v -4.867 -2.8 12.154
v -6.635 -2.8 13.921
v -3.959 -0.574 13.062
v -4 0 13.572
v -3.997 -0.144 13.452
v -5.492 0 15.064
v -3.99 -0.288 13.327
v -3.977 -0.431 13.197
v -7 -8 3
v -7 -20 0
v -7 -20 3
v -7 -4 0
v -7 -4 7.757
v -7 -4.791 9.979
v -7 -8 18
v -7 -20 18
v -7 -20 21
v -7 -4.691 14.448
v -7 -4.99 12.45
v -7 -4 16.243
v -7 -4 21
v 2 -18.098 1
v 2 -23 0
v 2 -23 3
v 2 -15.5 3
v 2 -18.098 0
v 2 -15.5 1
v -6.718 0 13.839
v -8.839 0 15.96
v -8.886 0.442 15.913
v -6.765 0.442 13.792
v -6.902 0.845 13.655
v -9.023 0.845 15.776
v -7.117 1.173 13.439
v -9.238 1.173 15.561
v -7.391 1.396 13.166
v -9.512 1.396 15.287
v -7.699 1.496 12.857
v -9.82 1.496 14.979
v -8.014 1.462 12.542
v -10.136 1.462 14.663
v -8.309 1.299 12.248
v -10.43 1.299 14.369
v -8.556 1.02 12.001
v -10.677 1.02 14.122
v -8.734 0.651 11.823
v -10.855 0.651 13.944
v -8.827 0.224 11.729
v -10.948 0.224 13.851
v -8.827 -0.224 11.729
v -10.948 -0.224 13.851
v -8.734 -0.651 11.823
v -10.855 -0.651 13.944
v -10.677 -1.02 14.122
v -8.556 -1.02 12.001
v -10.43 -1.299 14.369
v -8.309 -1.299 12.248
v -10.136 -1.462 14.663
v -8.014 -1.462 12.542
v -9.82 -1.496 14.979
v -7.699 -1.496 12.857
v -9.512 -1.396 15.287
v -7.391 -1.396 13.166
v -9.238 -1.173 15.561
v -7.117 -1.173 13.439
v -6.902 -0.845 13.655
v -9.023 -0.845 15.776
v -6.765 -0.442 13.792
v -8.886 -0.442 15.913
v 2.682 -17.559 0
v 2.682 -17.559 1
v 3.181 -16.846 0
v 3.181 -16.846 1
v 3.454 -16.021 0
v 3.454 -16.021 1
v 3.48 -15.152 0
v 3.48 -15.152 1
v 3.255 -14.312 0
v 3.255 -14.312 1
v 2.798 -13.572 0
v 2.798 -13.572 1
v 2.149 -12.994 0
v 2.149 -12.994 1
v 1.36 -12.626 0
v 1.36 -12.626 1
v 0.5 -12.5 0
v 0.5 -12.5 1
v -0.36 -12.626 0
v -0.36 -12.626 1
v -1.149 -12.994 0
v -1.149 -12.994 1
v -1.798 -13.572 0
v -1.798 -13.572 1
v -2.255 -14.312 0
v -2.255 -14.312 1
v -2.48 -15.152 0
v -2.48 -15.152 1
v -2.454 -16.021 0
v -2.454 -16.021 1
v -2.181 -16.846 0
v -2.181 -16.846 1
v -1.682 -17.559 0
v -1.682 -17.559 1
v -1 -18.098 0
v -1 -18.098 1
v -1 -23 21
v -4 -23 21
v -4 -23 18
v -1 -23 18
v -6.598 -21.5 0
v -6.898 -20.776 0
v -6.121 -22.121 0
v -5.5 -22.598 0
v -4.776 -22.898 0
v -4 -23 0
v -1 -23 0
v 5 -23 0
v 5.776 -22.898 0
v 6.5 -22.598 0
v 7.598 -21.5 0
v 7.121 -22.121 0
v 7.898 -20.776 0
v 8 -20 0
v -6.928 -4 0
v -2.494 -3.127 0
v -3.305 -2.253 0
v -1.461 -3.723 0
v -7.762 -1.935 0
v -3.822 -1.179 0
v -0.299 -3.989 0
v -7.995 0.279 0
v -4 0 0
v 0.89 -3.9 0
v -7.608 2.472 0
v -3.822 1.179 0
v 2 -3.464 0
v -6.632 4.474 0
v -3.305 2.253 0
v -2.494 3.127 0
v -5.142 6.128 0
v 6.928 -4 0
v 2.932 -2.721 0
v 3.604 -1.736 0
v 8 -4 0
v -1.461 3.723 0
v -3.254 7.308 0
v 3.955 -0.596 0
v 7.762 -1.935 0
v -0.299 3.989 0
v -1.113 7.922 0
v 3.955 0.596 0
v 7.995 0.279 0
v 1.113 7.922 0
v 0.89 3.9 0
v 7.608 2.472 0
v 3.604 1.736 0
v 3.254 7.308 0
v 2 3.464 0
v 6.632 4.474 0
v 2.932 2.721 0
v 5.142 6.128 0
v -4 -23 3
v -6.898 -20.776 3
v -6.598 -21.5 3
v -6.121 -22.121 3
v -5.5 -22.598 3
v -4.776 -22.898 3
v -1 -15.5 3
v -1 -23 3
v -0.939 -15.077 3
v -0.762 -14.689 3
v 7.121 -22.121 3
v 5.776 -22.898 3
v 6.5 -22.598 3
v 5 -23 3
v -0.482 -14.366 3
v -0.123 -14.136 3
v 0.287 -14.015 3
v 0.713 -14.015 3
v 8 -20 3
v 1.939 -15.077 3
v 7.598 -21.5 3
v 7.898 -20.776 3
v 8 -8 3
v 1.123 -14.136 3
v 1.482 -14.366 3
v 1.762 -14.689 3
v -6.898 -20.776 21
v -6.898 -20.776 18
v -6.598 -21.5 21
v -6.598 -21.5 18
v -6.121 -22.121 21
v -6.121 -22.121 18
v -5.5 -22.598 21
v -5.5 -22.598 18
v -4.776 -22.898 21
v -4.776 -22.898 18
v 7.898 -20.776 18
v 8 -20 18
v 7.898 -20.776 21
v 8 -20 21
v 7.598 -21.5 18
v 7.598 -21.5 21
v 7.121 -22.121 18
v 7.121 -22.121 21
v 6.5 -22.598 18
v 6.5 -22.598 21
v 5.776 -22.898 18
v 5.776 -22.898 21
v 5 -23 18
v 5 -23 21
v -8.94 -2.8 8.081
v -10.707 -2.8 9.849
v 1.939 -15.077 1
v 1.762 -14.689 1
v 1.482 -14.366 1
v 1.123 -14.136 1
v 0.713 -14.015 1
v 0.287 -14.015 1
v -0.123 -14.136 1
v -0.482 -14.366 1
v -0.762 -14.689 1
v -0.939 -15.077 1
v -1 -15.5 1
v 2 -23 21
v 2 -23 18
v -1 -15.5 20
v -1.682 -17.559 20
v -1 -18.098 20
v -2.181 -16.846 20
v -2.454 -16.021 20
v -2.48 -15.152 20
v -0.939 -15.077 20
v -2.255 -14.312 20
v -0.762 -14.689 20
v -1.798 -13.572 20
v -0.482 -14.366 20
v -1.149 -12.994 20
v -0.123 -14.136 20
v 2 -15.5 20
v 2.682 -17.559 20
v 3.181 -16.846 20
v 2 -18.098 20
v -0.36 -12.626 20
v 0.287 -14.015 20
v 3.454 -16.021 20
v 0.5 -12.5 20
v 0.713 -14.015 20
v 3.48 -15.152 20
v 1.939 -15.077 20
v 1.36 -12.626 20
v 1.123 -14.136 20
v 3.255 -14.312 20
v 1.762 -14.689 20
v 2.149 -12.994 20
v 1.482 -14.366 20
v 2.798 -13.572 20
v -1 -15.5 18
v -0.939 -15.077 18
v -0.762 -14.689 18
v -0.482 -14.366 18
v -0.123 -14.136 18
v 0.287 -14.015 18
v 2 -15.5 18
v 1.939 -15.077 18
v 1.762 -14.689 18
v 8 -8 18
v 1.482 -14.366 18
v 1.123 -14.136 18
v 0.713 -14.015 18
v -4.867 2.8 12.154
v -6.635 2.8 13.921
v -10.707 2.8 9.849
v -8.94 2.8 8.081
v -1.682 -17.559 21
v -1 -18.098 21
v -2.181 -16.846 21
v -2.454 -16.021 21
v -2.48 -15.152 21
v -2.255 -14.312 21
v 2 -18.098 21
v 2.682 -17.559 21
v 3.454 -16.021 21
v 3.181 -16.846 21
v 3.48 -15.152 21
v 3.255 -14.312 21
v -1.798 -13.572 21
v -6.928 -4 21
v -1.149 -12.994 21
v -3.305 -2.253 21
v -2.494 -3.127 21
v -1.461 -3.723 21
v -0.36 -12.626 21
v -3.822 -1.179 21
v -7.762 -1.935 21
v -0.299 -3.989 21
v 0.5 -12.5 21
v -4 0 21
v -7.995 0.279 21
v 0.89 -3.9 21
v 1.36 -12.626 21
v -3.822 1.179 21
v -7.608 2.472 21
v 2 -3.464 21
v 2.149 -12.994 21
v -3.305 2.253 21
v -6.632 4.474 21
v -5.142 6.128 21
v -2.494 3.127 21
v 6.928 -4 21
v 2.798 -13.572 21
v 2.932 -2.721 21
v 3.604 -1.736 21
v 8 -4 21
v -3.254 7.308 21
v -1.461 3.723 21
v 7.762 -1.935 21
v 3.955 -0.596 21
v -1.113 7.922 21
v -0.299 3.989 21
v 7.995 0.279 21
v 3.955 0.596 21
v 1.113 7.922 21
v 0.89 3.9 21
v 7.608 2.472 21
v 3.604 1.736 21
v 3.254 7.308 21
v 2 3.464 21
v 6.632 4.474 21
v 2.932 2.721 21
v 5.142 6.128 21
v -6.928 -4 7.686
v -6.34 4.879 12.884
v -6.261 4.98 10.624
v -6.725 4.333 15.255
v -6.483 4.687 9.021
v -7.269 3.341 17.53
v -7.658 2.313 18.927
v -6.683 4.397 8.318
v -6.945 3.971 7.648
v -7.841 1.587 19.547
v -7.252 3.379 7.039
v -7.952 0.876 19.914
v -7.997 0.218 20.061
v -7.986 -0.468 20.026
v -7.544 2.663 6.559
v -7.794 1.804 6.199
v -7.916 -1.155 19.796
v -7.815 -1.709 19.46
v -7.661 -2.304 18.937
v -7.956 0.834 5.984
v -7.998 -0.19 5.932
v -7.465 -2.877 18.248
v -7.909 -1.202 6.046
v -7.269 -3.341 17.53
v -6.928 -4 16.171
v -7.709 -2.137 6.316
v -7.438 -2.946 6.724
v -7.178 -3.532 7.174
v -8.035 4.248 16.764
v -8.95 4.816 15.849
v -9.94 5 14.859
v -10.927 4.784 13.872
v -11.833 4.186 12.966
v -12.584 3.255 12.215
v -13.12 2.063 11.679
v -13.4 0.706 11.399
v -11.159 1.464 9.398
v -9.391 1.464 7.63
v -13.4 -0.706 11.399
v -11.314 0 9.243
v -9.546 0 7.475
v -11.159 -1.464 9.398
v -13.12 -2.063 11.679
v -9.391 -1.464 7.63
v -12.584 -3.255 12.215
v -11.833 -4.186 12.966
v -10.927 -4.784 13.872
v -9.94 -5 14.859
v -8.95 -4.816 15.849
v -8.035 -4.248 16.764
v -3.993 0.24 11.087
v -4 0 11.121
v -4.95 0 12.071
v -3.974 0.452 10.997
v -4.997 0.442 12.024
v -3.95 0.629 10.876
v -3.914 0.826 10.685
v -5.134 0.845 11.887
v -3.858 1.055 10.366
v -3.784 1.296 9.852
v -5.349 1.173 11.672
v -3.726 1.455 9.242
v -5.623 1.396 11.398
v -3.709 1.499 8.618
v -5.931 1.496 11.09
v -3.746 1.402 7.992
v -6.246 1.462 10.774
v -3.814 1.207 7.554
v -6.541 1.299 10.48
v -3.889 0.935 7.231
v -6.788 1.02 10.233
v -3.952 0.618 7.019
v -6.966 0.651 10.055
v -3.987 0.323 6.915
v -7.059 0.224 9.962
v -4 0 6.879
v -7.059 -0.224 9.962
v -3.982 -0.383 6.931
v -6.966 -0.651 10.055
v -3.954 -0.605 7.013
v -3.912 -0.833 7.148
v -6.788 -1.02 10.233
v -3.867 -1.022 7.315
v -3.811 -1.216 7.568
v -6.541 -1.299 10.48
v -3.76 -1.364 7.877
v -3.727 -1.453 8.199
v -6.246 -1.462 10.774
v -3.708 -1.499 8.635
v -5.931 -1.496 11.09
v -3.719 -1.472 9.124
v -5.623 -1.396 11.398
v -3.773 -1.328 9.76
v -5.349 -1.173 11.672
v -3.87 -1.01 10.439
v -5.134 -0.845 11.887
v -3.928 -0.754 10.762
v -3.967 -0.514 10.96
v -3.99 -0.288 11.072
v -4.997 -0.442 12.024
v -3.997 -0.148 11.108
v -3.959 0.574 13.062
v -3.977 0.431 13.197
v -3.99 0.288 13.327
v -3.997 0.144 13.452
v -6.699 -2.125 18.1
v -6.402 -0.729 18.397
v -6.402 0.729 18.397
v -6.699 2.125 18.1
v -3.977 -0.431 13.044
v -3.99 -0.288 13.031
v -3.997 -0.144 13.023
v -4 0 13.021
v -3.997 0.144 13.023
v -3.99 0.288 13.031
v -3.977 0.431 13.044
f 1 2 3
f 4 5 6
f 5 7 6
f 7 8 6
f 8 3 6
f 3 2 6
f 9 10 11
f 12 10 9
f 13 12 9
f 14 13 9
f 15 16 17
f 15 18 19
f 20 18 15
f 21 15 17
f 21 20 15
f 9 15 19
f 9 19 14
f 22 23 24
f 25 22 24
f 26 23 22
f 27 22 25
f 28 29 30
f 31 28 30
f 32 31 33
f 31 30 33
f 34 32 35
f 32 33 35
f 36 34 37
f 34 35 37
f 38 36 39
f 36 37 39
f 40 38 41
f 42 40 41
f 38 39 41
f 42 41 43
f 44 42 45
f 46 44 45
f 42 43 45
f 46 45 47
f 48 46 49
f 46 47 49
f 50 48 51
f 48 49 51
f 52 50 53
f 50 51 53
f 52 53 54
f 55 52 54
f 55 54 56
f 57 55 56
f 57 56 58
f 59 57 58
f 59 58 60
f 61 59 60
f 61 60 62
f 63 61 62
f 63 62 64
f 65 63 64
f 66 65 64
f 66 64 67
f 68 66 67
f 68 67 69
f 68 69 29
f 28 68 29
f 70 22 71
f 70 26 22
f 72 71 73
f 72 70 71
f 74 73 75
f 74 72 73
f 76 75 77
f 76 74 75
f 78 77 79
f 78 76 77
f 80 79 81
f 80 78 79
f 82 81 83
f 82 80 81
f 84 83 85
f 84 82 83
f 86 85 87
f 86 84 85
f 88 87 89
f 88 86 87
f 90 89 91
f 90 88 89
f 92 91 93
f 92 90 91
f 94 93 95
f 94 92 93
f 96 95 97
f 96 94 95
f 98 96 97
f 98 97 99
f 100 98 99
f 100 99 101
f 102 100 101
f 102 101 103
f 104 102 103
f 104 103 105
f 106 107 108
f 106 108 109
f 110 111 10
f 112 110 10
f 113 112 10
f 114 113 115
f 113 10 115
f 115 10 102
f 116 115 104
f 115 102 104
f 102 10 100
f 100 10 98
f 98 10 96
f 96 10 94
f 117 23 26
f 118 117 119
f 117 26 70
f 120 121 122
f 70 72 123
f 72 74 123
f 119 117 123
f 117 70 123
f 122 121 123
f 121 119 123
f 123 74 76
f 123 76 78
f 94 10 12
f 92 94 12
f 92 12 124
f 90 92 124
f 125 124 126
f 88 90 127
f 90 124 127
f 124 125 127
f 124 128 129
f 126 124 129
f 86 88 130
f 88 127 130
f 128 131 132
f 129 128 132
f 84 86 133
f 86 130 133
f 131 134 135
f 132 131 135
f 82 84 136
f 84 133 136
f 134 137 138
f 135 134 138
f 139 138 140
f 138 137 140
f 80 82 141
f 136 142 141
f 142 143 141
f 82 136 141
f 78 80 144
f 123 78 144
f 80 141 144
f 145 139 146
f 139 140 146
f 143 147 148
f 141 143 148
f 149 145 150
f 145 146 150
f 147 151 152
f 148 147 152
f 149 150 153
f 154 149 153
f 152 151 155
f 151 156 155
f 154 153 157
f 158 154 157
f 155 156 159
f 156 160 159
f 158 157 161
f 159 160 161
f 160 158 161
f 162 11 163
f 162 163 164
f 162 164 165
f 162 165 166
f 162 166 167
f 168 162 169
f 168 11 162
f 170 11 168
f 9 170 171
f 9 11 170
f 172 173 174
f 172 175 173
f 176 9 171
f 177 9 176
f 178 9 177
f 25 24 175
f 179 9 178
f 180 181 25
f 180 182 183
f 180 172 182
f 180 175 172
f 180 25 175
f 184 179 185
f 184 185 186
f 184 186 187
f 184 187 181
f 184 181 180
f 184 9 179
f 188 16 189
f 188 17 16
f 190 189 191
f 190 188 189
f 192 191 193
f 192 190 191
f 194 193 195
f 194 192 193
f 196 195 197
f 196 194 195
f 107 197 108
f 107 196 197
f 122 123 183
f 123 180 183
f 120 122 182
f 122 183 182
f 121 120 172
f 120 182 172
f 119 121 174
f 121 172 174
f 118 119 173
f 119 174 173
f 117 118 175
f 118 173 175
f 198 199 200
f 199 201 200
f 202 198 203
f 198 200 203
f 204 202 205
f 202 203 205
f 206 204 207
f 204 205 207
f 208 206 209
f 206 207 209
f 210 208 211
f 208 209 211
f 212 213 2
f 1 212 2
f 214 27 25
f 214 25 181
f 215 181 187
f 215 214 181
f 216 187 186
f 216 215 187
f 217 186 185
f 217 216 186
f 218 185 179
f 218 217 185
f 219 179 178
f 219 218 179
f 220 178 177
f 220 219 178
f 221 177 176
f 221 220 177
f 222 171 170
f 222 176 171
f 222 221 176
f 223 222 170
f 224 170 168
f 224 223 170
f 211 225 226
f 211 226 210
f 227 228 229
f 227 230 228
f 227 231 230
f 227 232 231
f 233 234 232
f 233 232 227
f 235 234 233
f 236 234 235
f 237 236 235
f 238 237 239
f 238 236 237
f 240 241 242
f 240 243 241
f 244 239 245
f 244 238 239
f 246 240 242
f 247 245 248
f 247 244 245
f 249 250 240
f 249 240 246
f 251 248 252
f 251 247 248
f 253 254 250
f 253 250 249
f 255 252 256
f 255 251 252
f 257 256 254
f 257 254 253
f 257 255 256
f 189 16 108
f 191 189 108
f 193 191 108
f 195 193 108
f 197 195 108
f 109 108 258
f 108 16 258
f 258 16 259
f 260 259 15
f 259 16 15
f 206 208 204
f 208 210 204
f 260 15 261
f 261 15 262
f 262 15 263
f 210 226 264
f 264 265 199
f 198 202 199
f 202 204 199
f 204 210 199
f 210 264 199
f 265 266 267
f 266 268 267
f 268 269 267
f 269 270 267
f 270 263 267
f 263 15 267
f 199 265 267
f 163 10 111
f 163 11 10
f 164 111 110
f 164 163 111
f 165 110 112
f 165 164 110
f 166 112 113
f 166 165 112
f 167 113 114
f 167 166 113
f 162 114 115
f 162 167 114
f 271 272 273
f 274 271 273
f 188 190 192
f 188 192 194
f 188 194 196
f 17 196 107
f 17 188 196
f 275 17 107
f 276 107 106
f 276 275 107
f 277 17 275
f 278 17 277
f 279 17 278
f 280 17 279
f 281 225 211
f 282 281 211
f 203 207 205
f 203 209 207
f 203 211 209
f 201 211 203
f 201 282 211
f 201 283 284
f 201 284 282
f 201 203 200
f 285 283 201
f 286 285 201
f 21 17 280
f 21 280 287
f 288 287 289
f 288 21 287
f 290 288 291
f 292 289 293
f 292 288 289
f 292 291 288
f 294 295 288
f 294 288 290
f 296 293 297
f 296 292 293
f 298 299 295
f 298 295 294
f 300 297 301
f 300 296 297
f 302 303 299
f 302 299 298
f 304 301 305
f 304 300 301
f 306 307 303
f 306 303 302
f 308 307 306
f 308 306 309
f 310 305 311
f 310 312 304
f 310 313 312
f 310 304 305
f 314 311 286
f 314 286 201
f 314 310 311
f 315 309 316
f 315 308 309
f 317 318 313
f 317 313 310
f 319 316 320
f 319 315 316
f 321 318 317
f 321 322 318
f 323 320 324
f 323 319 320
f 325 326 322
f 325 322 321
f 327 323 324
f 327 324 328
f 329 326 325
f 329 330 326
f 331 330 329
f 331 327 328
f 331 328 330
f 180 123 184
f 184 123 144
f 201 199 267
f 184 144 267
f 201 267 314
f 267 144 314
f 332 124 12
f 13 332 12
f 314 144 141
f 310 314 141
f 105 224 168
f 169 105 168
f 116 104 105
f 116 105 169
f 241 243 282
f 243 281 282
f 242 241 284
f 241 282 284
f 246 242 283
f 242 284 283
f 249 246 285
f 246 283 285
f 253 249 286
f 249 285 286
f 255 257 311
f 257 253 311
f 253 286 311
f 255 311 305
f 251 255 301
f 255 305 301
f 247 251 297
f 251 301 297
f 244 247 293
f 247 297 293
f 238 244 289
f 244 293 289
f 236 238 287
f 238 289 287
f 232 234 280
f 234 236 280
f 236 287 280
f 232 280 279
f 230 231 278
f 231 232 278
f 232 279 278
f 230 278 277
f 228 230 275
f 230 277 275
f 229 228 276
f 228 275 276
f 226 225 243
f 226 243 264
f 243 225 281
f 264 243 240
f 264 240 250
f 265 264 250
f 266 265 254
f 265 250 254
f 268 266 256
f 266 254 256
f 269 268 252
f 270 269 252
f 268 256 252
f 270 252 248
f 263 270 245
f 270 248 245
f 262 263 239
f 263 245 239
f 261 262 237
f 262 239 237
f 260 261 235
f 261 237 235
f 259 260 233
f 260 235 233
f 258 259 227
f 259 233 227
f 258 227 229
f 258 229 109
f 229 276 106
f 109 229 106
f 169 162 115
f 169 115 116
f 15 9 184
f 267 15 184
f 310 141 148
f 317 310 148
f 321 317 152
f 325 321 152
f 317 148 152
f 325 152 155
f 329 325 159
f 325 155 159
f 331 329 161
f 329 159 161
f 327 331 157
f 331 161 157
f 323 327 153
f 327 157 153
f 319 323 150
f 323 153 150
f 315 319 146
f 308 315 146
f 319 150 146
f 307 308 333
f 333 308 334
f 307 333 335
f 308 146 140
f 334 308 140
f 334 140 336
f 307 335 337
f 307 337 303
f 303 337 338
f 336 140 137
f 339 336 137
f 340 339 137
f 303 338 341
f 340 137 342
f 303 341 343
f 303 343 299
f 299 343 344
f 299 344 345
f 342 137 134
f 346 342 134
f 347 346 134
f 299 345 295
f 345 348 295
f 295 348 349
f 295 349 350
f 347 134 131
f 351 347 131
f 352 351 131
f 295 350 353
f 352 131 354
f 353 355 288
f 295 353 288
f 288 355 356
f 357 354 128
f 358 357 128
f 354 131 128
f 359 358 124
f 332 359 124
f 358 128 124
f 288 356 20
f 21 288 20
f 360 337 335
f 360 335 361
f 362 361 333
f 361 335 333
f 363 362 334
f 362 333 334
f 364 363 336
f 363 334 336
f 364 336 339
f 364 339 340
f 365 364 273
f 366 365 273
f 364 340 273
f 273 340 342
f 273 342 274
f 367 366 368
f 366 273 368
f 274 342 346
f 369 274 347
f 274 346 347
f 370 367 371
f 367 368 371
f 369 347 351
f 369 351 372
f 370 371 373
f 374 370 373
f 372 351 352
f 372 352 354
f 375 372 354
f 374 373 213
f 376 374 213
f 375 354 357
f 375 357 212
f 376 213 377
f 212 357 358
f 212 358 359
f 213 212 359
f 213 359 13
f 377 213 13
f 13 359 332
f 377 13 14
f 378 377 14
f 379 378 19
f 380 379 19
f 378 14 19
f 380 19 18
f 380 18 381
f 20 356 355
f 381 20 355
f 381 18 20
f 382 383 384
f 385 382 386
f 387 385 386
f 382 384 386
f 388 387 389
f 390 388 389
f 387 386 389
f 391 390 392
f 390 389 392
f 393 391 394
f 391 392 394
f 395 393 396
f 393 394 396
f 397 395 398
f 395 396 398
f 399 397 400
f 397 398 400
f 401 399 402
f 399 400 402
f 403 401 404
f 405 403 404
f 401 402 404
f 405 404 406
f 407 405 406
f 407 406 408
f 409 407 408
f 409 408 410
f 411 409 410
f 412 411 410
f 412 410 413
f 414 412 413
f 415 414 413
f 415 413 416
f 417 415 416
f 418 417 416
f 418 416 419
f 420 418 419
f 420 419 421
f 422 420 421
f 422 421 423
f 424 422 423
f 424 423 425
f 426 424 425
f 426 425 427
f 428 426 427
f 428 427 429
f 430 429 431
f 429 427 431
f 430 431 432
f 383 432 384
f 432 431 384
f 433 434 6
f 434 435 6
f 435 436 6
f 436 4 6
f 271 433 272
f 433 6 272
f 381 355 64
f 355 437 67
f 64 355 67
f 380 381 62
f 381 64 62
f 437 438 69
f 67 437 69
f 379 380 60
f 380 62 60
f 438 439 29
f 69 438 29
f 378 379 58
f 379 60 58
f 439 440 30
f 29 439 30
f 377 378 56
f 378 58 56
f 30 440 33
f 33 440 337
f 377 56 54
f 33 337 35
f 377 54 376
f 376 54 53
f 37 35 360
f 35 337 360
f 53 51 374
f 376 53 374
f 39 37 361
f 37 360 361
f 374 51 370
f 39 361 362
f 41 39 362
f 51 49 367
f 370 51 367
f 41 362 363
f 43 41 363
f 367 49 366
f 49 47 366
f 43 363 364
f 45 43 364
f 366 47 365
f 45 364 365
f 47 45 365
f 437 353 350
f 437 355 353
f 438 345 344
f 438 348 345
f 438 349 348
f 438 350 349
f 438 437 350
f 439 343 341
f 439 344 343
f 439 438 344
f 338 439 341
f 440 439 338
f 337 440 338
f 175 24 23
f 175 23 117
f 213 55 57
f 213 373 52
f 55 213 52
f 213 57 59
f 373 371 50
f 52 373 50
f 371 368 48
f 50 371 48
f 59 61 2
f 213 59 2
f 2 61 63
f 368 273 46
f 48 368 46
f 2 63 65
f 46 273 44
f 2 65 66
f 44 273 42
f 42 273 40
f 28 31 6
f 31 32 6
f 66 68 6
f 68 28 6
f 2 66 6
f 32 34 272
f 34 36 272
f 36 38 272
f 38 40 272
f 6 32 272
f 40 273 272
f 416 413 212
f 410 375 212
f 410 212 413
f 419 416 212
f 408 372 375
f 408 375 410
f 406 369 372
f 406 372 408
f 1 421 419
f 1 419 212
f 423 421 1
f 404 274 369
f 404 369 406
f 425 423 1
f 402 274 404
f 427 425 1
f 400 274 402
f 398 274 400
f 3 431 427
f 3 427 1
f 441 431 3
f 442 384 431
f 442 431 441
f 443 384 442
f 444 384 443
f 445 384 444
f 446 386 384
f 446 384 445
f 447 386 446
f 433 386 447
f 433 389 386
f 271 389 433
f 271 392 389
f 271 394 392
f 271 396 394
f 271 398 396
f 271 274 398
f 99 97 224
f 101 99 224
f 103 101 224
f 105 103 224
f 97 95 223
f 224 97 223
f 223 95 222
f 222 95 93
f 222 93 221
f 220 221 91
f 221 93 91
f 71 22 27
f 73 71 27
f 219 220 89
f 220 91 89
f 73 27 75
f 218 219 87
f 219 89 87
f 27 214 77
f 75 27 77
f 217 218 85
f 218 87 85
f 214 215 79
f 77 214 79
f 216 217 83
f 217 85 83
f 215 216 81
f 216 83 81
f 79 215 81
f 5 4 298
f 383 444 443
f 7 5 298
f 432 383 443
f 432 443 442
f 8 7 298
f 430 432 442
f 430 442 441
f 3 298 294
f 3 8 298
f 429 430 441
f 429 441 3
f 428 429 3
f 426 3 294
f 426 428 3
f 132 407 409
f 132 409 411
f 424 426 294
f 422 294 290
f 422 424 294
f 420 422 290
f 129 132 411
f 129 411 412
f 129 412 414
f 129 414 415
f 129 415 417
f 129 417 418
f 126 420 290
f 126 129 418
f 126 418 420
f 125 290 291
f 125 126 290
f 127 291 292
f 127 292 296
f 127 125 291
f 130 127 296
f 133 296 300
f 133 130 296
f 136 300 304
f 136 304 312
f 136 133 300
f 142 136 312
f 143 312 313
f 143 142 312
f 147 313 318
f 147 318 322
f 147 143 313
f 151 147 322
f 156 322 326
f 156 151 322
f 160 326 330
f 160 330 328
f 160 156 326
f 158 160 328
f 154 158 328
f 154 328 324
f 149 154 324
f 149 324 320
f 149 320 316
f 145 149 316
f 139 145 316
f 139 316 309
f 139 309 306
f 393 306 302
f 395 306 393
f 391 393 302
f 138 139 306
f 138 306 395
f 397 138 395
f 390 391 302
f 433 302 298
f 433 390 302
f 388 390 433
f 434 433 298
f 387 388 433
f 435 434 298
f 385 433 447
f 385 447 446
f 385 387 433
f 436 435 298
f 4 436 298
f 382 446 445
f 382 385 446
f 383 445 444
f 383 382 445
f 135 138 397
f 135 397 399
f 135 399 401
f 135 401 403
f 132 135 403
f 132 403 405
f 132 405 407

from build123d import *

# Parameters (mm, degrees)
SKETCH1_R           = 4
BOSS_EXTRUDE1_DEPTH = 21
SKETCH3_W           = 15
SKETCH3_H           = 3
BOSS_EXTRUDE2_DEPTH = 15
SKETCH4_R           = 3
CUT_EXTRUDE1_DEPTH  = 1
SKETCH5_R           = 1.5
CUT_EXTRUDE2_DEPTH  = 4
FILLET1_R           = 3
CUT_EXTRUDE3_START  = -27
SKETCH7_R           = 4
CUT_EXTRUDE3_DEPTH  = 27
SKETCH8_R           = 1.5
CUT_EXTRUDE4_DEPTH  = 14
CUT_EXTRUDE5_DEPTH  = 2.5
SKETCH10_R          = 5
CUT_EXTRUDE6_DEPTH  = 7.5


with BuildPart() as part:
    # Sketch1 → Boss-Extrude1 (new body)
    with BuildSketch(Plane.XY):
        with BuildLine():
            ThreePointArc((6.92820323, -4), (0, 8), (-6.92820323, -4))
            Line((-6.92820323, -4), (-7, -4))
            Line((-7, -4), (-7, -8))
            Line((-7, -8), (8, -8))
            Line((8, -8), (8, -4))
            Line((8, -4), (6.92820323, -4))
        make_face()
        with Locations(Location((0, 0, 0), (0, 0, 180))):
            Circle(SKETCH1_R, mode=Mode.SUBTRACT)
    extrude(amount=BOSS_EXTRUDE1_DEPTH)

    # Sketch3 → Boss-Extrude2 (add)
    with BuildSketch(Plane.XZ.offset(8)):
        with Locations((0.5, 19.5)):
            Rectangle(SKETCH3_W, SKETCH3_H)
        with Locations((0.5, 1.5)):
            Rectangle(SKETCH3_W, SKETCH3_H)
    extrude(amount=BOSS_EXTRUDE2_DEPTH)

    # Sketch4 → Cut-Extrude1 (cut)
    with BuildSketch(Plane.XY.offset(21)):
        with Locations((0.5, -15.5)):
            Circle(SKETCH4_R)
    cut_extrude1 = extrude(amount=-CUT_EXTRUDE1_DEPTH, mode=Mode.SUBTRACT)

    # Sketch5 → Cut-Extrude2 (cut, symmetric)
    with BuildSketch(Plane.XY.offset(20)):
        with Locations((0.5, -15.5)):
            Circle(SKETCH5_R)
        with BuildLine():
            Line((2, -18.098076211), (2, -15.5))
            ThreePointArc((2, -15.5), (0.5, -17), (-1, -15.5))
            Line((-1, -15.5), (-1, -18.098076211))
            ThreePointArc((-1, -18.098076211), (0.5, -18.5), (2, -18.098076211))
        make_face()
        with BuildLine():
            Line((2, -23), (2, -18.098076211))
            ThreePointArc((2, -18.098076211), (0.5, -18.5), (-1, -18.098076211))
            Line((-1, -18.098076211), (-1, -23))
            Line((-1, -23), (2, -23))
        make_face()
    cut_extrude2 = extrude(amount=CUT_EXTRUDE2_DEPTH, both=True, mode=Mode.SUBTRACT)

    # Mirror1: Cut-Extrude1, Cut-Extrude2 across plane
    add(cut_extrude1.mirror(Plane.XY.offset(10.5)), mode=Mode.SUBTRACT)
    add(cut_extrude2.mirror(Plane.XY.offset(10.5)), mode=Mode.SUBTRACT)

    # Fillet1
    fillet1_edges = [part.edges().sort_by_distance(p)[0] for p in [
        (8, -23, 19.5),
        (-7, -23, 19.5),
        (8, -23, 1.5),
        (-7, -23, 1.5),
    ]]
    fillet(fillet1_edges, radius=FILLET1_R)

    # Sketch6 → Revolve1 (revolve)
    with BuildSketch(Plane(origin=(0, 0, 0), x_dir=(1, 0, 0), z_dir=(0, 1, 0))):
        Polygon((-9.899494937, -14.899494937), (-6.363961031, -18.435028843), (0, -12.071067812), (-3.535533906, -8.535533906), align=None)
    revolve(axis=Axis((0, 0, 5), (-0.7071067811865487, 0, 0.7071067811865465)))

    # Sketch7 → Cut-Extrude3 (cut)
    with BuildSketch(Plane.XY.offset(21).offset(CUT_EXTRUDE3_START)):
        with Locations(Location((0, 0, 0), (0, 0, 180))):
            Circle(SKETCH7_R)
    extrude(amount=CUT_EXTRUDE3_DEPTH, mode=Mode.SUBTRACT)

    # Sketch8 → Cut-Extrude4 (cut)
    with BuildSketch(Plane(origin=(-12.399494937, 0, 12.399494937), x_dir=(0.7071067811865464, 0, 0.7071067811865487), z_dir=(-0.7071067811865487, 0, 0.7071067811865464))):
        with Locations((3.535533906, 0)):
            Circle(SKETCH8_R)
    extrude(amount=-CUT_EXTRUDE4_DEPTH, mode=Mode.SUBTRACT)

    # Sketch9 → Cut-Extrude5 (cut)
    with BuildSketch(Plane(origin=(-10.278174593, 0, 10.278174593), x_dir=(0.7071067811865464, 0, 0.7071067811865487), z_dir=(-0.7071067811865487, 0, 0.7071067811865464))):
        Polygon((1.918953152, -2.8), (5.15211466, -2.8), (6.768695413, 0), (5.15211466, 2.8), (1.918953152, 2.8), (0.302372398, 0), align=None)
        Polygon((-2.926090212, -2.8), (-2.926090212, 2.8), (1.918953152, 2.8), (0.302372398, 0), (1.918953152, -2.8), align=None)
    extrude(amount=-CUT_EXTRUDE5_DEPTH, mode=Mode.SUBTRACT)

    # Sketch10 → Cut-Extrude6 (cut)
    with BuildSketch(Plane(origin=(-12.399494937, 0, 12.399494937), x_dir=(0.7071067811865464, 0, 0.7071067811865487), z_dir=(-0.7071067811865487, 0, 0.7071067811865464))):
        with Locations((3.535533906, 0)):
            Circle(SKETCH10_R)
    extrude(amount=CUT_EXTRUDE6_DEPTH, mode=Mode.SUBTRACT)


solid = part.part
